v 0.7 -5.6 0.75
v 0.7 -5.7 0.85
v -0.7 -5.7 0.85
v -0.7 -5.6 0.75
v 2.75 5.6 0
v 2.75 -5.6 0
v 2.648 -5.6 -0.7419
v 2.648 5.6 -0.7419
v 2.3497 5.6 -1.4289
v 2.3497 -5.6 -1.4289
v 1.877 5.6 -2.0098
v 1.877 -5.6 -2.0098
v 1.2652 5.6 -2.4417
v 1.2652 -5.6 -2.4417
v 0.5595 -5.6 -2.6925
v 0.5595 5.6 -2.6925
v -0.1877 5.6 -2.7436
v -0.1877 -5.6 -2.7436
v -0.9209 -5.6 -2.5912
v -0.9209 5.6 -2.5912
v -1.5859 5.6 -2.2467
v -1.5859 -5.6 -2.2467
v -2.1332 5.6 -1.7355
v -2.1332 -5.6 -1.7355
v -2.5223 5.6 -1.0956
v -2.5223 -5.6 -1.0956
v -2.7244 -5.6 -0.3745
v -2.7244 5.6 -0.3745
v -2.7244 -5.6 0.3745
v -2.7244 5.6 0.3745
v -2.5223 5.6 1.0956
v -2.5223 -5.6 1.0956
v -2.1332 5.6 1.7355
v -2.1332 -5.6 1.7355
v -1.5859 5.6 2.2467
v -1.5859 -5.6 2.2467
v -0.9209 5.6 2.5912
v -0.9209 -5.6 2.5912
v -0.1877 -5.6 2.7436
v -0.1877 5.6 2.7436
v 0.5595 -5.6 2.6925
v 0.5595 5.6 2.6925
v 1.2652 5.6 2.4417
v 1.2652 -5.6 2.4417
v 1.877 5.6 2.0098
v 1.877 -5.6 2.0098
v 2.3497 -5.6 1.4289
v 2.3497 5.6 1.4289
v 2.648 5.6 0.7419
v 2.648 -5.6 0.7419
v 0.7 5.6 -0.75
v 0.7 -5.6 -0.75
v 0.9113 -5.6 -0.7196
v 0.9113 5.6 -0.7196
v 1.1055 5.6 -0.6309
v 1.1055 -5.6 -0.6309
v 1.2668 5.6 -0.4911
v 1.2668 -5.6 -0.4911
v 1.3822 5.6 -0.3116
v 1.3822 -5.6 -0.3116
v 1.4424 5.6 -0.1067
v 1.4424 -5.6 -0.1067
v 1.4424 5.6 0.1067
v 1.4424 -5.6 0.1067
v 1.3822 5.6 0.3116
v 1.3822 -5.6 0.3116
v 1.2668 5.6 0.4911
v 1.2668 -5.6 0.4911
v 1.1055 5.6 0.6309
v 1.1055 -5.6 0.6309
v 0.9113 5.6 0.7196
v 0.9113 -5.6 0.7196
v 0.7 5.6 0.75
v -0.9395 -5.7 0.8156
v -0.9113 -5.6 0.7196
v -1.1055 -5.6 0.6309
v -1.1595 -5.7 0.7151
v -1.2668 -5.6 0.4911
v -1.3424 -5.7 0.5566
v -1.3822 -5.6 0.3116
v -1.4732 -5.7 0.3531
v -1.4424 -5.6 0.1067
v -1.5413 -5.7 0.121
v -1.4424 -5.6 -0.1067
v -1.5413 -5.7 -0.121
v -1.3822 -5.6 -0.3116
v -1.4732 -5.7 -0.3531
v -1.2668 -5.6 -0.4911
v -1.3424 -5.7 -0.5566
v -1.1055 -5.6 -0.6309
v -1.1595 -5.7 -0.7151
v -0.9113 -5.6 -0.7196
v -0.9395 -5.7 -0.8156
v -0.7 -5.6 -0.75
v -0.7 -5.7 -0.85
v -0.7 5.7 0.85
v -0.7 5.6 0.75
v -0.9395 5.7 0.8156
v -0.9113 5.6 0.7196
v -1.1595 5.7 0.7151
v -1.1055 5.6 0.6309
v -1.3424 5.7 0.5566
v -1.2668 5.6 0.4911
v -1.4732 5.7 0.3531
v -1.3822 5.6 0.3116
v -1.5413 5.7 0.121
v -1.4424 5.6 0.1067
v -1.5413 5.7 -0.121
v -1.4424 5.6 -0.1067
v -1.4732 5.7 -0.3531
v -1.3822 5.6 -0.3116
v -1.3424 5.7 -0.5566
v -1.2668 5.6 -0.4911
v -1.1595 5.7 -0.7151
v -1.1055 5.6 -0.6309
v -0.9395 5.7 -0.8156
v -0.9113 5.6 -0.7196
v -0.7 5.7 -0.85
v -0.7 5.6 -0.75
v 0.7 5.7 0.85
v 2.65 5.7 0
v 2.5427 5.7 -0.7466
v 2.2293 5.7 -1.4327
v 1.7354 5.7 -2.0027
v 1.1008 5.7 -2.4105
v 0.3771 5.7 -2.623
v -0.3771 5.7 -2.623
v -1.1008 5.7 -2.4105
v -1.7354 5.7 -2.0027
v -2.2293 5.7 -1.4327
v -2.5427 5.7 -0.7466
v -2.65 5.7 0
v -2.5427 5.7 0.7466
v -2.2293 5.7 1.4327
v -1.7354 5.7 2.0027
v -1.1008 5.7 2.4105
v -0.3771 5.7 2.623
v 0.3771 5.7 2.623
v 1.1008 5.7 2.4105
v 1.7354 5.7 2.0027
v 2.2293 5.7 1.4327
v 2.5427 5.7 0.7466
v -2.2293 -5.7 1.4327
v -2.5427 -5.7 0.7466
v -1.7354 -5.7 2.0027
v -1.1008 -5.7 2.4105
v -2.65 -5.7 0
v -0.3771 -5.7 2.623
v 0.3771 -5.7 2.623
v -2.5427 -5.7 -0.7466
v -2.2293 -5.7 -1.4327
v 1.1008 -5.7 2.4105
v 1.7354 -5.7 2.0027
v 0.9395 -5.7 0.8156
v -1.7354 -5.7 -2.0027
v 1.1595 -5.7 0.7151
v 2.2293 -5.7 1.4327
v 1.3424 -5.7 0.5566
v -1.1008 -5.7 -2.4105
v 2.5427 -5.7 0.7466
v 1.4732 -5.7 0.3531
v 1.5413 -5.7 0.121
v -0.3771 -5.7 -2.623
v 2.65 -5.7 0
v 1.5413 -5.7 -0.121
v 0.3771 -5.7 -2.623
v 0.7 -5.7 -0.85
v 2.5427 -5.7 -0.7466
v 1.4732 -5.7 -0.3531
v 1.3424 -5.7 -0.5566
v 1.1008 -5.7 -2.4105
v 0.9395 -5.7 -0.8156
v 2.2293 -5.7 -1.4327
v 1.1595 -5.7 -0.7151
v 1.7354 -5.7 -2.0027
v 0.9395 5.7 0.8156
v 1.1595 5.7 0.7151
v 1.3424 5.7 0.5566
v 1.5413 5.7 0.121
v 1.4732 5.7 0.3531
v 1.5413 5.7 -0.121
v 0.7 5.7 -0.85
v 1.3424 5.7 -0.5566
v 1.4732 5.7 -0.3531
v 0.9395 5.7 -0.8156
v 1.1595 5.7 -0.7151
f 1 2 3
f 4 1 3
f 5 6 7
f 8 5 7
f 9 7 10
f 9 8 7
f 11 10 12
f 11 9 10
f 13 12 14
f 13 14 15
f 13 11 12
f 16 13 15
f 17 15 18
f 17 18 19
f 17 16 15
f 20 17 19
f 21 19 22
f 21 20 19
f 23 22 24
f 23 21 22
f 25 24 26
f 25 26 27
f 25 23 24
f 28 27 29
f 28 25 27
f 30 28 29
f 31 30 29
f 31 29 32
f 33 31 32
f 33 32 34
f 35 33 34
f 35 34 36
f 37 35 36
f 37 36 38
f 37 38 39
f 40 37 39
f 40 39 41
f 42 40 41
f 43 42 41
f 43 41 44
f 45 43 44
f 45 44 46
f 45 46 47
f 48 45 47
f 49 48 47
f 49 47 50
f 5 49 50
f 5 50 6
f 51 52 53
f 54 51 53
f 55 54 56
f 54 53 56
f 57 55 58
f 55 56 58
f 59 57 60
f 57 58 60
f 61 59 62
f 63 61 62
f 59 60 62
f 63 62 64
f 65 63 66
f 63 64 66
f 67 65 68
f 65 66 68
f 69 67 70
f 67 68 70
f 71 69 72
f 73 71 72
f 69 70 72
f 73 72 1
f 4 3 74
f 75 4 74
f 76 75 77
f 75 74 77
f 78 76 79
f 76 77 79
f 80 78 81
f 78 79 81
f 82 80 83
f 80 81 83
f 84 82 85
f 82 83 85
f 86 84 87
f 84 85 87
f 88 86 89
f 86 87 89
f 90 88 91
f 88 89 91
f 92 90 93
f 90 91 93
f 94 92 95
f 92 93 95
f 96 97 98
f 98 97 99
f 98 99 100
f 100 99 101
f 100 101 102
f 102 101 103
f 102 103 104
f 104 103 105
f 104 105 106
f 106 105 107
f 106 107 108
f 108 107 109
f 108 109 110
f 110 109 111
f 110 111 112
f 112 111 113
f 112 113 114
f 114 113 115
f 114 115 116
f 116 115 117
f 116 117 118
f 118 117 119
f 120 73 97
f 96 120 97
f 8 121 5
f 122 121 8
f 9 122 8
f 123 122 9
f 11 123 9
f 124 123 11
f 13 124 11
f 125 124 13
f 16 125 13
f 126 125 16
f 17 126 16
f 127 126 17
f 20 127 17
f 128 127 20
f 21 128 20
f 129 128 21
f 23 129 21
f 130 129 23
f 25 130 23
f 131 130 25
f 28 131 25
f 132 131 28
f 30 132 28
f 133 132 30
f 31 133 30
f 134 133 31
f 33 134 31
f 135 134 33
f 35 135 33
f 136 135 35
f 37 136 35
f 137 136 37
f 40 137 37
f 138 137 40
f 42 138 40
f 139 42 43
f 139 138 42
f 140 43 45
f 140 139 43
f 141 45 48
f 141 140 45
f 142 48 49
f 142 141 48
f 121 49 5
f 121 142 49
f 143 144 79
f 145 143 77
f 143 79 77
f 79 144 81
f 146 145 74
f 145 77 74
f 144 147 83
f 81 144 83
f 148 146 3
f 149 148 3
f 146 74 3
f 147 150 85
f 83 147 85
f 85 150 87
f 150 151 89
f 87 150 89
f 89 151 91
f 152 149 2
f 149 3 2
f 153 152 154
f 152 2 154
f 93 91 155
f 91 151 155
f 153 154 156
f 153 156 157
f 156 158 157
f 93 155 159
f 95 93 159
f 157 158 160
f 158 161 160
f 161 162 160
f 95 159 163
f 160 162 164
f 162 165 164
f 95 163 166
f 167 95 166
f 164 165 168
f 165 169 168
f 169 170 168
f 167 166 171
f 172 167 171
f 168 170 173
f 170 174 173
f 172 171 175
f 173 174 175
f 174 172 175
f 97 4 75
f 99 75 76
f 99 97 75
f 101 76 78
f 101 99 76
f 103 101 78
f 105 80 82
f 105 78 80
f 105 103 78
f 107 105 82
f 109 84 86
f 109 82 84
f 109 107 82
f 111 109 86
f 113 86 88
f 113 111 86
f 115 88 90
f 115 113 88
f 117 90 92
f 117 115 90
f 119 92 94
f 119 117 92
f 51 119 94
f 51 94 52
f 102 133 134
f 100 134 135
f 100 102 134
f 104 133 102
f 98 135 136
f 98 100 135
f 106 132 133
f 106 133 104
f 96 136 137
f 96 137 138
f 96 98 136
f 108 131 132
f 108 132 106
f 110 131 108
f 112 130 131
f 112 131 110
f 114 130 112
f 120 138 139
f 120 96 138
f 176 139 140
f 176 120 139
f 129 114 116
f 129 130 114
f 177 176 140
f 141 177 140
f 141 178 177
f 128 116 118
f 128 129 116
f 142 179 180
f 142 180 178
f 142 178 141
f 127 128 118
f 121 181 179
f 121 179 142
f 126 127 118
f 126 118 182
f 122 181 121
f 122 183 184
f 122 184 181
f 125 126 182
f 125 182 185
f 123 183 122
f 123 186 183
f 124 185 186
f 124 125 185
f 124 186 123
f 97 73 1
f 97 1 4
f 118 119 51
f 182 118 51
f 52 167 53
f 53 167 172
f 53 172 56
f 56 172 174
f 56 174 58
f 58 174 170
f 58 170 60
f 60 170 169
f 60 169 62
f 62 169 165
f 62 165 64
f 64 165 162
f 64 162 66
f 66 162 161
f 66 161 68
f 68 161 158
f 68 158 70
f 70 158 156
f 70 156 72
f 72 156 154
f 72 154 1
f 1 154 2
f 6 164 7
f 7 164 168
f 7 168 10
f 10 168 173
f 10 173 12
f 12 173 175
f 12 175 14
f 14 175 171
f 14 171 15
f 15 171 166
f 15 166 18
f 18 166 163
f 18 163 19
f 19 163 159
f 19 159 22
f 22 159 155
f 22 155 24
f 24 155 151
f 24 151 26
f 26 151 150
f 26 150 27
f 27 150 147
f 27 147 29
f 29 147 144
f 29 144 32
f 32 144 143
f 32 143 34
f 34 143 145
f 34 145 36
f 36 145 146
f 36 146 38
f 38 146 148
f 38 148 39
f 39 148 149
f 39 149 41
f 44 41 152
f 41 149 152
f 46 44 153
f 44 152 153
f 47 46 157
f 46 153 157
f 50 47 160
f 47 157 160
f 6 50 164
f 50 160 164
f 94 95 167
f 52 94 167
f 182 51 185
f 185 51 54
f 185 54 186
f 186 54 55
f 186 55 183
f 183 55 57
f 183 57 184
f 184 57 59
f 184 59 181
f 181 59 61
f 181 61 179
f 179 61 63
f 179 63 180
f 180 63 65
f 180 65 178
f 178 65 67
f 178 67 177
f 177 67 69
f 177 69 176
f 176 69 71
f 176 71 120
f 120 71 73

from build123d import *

# Parameters (mm, degrees)
SKETCH1_R          = 2.75
SKETCH1_R_2        = 1.45
MAIN_EXTRUDE_DEPTH = 5.7
MAIN_CHAMFER_SIZE  = 0.1


with BuildPart() as part:
    # Sketch1 → main extrude (new body, symmetric)
    with BuildSketch(Plane(origin=(0, 0, 0), x_dir=(1, 0, 0), z_dir=(0, 1, 0))):
        Circle(SKETCH1_R)
        Circle(SKETCH1_R_2, mode=Mode.SUBTRACT)
        with BuildLine():
            ThreePointArc((-0.7, -0.75), (-1.230330086, -0.530330086), (-1.45, 0))
            ThreePointArc((-1.45, 0), (0, -1.45), (1.45, 0))
            ThreePointArc((1.45, 0), (1.230330086, -0.530330086), (0.7, -0.75))
            Line((0.7, -0.75), (-0.7, -0.75))
        make_face()
        with BuildLine():
            ThreePointArc((-1.45, 0), (-1.230330086, 0.530330086), (-0.7, 0.75))
            Line((-0.7, 0.75), (0.7, 0.75))
            ThreePointArc((0.7, 0.75), (1.230330086, 0.530330086), (1.45, 0))
            ThreePointArc((1.45, 0), (0, 1.45), (-1.45, 0))
        make_face()
    extrude(amount=MAIN_EXTRUDE_DEPTH, both=True)

    # main chamfer
    main_chamfer_edges = [part.edges().sort_by_distance(p)[0] for p in [
        (0, 5.7, 0.75),
        (-1.45, 5.7, 0),
        (-2.75, 5.7, 0),
        (0, 5.7, -0.75),
        (-2.75, -5.7, 0),
        (-1.45, -5.7, 0),
        (0, -5.7, 0.75),
        (1.45, -5.7, 0),
        (0, -5.7, -0.75),
        (1.45, 5.7, 0),
    ]]
    chamfer(main_chamfer_edges, length=MAIN_CHAMFER_SIZE)


solid = part.part
